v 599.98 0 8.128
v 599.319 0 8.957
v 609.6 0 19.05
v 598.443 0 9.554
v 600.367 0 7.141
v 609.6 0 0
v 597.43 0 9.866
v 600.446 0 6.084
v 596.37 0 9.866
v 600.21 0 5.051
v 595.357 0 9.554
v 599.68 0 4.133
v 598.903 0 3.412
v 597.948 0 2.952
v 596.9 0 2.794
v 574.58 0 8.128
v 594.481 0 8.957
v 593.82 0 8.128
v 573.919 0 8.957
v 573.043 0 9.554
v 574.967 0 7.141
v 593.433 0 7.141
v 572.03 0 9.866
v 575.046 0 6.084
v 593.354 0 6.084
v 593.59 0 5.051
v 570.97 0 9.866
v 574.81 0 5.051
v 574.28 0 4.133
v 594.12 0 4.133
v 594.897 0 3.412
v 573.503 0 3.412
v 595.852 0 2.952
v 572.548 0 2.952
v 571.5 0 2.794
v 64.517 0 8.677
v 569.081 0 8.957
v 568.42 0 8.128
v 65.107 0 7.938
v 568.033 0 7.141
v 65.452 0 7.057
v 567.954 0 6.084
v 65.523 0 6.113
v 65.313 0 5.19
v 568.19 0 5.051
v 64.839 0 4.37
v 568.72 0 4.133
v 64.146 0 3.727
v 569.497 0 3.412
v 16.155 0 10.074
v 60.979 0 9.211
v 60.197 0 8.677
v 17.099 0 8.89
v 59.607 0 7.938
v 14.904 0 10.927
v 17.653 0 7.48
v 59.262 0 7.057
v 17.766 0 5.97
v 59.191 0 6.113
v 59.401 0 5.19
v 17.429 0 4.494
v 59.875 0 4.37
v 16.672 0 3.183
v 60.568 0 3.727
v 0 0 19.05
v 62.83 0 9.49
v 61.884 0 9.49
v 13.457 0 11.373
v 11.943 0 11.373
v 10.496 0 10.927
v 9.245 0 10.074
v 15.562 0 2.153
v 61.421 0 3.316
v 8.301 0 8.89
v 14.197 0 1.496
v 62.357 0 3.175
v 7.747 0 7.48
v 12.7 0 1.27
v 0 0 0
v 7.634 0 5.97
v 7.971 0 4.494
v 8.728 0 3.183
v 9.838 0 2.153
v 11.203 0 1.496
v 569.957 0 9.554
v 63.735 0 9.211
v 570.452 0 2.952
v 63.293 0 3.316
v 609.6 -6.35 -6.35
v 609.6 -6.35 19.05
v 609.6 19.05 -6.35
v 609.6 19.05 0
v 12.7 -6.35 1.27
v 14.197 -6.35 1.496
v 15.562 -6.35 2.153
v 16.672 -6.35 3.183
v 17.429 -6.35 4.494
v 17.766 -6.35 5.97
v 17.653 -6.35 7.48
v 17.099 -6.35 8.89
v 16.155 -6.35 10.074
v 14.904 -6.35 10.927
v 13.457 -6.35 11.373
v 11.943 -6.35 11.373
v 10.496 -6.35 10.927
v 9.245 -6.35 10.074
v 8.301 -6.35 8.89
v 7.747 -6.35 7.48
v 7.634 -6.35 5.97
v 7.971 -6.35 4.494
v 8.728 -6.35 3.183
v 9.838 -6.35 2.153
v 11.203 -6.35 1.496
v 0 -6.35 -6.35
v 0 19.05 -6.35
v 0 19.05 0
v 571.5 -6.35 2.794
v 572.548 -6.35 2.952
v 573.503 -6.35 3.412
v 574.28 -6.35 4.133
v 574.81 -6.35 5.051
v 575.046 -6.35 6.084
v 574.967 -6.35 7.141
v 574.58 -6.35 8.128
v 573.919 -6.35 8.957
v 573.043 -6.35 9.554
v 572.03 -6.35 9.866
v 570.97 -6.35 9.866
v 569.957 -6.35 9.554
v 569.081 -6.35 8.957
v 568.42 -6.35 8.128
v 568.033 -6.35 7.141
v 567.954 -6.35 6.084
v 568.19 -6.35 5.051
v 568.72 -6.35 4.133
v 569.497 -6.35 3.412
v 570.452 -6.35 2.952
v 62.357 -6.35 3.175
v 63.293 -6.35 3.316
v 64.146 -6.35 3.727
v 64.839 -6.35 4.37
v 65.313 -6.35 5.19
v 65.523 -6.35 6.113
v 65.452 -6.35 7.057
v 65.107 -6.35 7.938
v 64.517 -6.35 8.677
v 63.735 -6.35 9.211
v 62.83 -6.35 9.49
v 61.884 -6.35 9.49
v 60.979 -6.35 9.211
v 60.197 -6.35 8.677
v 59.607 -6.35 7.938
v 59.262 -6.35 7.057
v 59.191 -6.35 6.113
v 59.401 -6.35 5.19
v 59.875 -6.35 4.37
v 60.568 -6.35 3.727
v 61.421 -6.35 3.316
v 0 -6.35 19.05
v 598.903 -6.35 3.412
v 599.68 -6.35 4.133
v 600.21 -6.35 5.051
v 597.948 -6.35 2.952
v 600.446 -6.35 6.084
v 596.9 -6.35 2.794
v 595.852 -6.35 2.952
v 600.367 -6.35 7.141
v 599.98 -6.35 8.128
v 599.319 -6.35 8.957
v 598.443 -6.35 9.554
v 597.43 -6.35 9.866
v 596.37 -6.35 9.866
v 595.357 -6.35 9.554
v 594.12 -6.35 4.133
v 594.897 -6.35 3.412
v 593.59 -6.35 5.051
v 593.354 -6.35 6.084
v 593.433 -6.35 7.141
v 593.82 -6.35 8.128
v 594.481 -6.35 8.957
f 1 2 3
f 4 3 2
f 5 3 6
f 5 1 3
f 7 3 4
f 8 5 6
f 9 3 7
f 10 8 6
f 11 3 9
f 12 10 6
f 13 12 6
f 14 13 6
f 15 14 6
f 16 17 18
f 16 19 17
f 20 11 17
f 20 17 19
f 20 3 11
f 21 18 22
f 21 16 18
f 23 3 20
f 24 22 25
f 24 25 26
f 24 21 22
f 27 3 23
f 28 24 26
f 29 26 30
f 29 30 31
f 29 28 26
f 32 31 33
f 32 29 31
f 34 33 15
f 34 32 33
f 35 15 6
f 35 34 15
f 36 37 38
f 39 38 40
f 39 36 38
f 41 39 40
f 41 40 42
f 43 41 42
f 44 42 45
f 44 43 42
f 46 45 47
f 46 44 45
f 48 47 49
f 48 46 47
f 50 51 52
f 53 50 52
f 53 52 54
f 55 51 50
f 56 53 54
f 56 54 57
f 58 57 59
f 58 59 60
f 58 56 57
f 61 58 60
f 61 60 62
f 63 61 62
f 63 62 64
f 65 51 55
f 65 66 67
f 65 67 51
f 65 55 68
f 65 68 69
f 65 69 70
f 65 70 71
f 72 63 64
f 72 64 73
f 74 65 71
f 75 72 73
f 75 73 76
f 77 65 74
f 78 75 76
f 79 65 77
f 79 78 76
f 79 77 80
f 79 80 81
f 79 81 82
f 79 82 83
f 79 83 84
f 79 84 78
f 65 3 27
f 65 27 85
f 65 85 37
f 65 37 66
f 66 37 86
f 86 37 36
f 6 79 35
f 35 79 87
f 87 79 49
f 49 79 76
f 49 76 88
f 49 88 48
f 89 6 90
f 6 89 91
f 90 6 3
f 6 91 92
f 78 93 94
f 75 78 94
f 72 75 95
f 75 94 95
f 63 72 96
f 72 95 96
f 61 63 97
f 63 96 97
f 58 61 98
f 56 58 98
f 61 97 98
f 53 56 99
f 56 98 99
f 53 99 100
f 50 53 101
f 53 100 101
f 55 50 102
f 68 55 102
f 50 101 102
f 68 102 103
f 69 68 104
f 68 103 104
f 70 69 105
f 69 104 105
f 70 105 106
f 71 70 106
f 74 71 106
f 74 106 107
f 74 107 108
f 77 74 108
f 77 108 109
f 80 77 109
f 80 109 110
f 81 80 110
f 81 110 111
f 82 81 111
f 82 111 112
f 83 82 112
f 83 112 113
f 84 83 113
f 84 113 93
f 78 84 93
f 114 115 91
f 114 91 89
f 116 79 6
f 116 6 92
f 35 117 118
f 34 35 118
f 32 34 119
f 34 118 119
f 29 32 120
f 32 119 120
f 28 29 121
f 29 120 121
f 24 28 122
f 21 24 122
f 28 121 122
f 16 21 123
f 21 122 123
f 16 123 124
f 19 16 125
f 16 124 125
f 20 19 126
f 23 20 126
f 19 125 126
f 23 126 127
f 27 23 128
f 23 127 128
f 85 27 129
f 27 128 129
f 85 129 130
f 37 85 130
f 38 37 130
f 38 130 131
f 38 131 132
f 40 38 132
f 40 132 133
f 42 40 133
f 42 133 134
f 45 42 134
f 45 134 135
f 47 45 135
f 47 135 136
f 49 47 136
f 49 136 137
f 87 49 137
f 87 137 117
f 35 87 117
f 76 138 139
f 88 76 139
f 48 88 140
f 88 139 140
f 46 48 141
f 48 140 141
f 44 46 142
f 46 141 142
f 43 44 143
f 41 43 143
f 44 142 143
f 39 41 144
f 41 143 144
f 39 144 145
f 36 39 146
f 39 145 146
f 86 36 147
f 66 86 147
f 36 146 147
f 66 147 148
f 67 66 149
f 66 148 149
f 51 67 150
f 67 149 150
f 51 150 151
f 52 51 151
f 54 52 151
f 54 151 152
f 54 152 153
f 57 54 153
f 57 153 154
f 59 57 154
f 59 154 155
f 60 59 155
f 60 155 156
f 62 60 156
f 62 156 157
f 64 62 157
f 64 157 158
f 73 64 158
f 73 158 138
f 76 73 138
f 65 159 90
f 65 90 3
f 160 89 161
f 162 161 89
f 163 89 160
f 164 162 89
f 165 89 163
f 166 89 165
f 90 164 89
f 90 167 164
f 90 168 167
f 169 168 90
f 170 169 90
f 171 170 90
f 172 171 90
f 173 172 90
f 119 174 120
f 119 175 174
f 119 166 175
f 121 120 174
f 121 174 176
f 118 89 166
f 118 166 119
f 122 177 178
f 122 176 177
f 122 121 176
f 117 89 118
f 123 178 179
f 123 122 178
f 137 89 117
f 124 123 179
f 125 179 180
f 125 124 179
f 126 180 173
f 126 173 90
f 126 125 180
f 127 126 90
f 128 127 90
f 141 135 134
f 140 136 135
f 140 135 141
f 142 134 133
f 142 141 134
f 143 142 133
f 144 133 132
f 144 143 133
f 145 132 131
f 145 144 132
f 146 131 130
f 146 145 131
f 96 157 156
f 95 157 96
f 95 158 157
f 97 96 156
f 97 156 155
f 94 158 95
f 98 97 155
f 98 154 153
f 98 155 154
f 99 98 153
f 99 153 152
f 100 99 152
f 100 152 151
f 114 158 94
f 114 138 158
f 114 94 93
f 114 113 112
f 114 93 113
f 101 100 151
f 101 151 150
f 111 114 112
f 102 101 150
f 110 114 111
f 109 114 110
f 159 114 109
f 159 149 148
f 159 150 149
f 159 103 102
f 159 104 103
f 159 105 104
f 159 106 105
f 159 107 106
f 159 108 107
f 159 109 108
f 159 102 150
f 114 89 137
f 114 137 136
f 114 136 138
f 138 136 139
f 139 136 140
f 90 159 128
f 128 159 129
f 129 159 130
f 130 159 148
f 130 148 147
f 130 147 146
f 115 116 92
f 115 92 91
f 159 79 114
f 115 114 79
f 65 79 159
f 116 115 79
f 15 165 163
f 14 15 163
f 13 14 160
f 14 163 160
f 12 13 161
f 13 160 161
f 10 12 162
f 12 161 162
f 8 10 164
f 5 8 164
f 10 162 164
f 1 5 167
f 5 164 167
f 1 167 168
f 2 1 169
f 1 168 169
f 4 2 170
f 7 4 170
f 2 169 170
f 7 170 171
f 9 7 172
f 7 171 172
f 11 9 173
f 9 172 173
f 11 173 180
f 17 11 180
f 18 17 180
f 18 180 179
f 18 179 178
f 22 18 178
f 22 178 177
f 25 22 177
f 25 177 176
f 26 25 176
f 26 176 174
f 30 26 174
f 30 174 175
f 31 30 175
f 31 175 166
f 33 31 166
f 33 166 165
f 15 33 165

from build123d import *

# Parameters (mm, degrees)
BOSS_EXTRUDE1_DEPTH = 609.6
SKETCH2_R           = 5.08
SKETCH2_R_2         = 3.175
SKETCH2_R_3         = 3.556
CUT_EXTRUDE1_DEPTH  = 914.4


with BuildPart() as part:
    # Sketch1 → Boss-Extrude1 (new body)
    with BuildSketch(Plane(origin=(0, 0, 0), x_dir=(0, 0, -1), z_dir=(1, 0, 0))):
        Polygon((0, 0), (0, 19.05), (6.35, 19.05), (6.35, -6.35), (-19.05, -6.35), (-19.05, 0), align=None)
    extrude(amount=BOSS_EXTRUDE1_DEPTH)

    # Sketch2 → Cut-Extrude1 (cut)
    with BuildSketch(Plane.XZ.offset(6.35)):
        with Locations(Location((12.7, 6.35, 0), (0, 0, 270))):
            Circle(SKETCH2_R)
        with Locations(Location((62.357, 6.35, 0), (0, 0, 270))):
            Circle(SKETCH2_R_2)
        with Locations(Location((596.9, 6.35, 0), (0, 0, 270))):
            Circle(SKETCH2_R_3)
        with Locations(Location((571.5, 6.35, 0), (0, 0, 270))):
            Circle(SKETCH2_R_3)
    extrude(amount=-CUT_EXTRUDE1_DEPTH, mode=Mode.SUBTRACT)


solid = part.part
